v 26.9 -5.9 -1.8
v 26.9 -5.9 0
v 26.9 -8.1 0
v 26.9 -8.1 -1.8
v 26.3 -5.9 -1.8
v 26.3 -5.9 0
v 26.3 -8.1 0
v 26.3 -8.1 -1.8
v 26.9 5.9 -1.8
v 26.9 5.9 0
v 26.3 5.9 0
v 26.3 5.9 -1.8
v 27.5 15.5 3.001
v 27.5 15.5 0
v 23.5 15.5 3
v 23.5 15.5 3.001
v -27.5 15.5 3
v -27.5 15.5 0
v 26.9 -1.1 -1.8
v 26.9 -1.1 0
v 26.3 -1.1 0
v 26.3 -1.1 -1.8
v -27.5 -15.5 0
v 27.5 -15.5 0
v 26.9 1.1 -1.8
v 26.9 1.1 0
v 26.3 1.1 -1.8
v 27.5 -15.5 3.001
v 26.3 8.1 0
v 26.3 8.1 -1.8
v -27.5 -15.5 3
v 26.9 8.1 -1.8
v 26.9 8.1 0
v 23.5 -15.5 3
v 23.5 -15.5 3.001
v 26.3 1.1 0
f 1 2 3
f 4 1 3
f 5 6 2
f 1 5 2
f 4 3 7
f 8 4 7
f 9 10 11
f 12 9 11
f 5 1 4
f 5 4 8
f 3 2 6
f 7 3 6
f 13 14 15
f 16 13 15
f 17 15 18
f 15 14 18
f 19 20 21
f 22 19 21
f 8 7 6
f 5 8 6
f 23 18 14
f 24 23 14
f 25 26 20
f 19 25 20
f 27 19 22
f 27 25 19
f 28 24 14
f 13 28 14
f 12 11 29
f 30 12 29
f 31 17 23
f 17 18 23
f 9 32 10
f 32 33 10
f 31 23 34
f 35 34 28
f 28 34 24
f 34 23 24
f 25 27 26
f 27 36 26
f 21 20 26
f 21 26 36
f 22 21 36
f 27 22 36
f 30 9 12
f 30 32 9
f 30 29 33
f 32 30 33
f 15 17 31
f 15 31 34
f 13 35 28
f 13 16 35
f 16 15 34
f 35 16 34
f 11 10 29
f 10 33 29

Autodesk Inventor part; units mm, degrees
ref_plane "YZ Plane" through (0, 0, 0) normal (1, 0, 0) x (0, 1, 0)
ref_plane "XZ Plane" through (0, 0, 0) normal (0, 1, 0) x (-1, 0, 0)
ref_plane "XY Plane" through (0, 0, 0) normal (0, 0, 1) x (1, 0, 0)
sketch "Sketch10" plane through (0, 0, 0) normal (0, 0, 1) x (1, 0, 0)
  line L0 (-27.5, -15.5) -> (27.5, -15.5)
  line L1 (27.5, -15.5) -> (27.5, 15.5)
  line L2 (27.5, 15.5) -> (-27.5, 15.5)
  line L3 (-27.5, 15.5) -> (-27.5, -15.5)
  line L4 (-27.5, -15.5) -> (27.5, 15.5) construction
  line L5 (27.5, -15.5) -> (-27.5, 15.5) construction
  point P0 (0, 0)
  dimension "d58" = 55
  dimension "d59" = 31
extrude "Extrusion9" add sketch "Sketch10" along normal blind 3
sketch "Sketch12" plane through (0, 0, 3) normal (0, 0, 1) x (1, 0, 0)
  line L0 (27.5, -15.5) -> (27.5, 15.5) projected
  line L1 (-27.5, -15.5) -> (27.5, -15.5) projected
  line L2 (27.5, 15.5) -> (23.5, 15.5)
  line L3 (23.5, 15.5) -> (23.5, -15.5)
  line L4 (23.5, -15.5) -> (27.5, -15.5)
  line L5 (27.5, -15.5) -> (27.5, 15.5)
  point P0 (0, 0)
  dimension "d72" = 4
extrude "Extrusion11" add sketch "Sketch12" along normal blind 0.001
sketch "Sketch11" plane through (-12.75, 0, 0) normal (0, 0, -1) x (-1, 0, 0)
  line L0 (-39.65, -1.1) -> (-39.05, -1.1)
  line L1 (-39.05, -1.1) -> (-39.05, 1.1)
  line L2 (-39.05, 1.1) -> (-39.65, 1.1)
  line L3 (-39.65, 1.1) -> (-39.65, -1.1)
  line L4 (-40.25, -15.5) -> (-40.25, 15.5)
  line L5 (-40.25, -15.5) -> (-40.25, 15.5) projected
  point P0 (-39.65, 0)
  point P1 (-40.25, 0)
  point P2 (-40.25, 0)
  dimension "d64" = 0.6
  dimension "d65" = 2.2
  dimension "d63" = 0.6
extrude "Extrusion10" add sketch "Sketch11" along normal blind 1.8 separate body
pattern_linear "Rectangular Pattern1" count 3 spacing 7 along (0, -1, 0) of "Extrusion10" first direction both ways yes bodies 2
properties part number "DISP BKL LED TB1012S"
